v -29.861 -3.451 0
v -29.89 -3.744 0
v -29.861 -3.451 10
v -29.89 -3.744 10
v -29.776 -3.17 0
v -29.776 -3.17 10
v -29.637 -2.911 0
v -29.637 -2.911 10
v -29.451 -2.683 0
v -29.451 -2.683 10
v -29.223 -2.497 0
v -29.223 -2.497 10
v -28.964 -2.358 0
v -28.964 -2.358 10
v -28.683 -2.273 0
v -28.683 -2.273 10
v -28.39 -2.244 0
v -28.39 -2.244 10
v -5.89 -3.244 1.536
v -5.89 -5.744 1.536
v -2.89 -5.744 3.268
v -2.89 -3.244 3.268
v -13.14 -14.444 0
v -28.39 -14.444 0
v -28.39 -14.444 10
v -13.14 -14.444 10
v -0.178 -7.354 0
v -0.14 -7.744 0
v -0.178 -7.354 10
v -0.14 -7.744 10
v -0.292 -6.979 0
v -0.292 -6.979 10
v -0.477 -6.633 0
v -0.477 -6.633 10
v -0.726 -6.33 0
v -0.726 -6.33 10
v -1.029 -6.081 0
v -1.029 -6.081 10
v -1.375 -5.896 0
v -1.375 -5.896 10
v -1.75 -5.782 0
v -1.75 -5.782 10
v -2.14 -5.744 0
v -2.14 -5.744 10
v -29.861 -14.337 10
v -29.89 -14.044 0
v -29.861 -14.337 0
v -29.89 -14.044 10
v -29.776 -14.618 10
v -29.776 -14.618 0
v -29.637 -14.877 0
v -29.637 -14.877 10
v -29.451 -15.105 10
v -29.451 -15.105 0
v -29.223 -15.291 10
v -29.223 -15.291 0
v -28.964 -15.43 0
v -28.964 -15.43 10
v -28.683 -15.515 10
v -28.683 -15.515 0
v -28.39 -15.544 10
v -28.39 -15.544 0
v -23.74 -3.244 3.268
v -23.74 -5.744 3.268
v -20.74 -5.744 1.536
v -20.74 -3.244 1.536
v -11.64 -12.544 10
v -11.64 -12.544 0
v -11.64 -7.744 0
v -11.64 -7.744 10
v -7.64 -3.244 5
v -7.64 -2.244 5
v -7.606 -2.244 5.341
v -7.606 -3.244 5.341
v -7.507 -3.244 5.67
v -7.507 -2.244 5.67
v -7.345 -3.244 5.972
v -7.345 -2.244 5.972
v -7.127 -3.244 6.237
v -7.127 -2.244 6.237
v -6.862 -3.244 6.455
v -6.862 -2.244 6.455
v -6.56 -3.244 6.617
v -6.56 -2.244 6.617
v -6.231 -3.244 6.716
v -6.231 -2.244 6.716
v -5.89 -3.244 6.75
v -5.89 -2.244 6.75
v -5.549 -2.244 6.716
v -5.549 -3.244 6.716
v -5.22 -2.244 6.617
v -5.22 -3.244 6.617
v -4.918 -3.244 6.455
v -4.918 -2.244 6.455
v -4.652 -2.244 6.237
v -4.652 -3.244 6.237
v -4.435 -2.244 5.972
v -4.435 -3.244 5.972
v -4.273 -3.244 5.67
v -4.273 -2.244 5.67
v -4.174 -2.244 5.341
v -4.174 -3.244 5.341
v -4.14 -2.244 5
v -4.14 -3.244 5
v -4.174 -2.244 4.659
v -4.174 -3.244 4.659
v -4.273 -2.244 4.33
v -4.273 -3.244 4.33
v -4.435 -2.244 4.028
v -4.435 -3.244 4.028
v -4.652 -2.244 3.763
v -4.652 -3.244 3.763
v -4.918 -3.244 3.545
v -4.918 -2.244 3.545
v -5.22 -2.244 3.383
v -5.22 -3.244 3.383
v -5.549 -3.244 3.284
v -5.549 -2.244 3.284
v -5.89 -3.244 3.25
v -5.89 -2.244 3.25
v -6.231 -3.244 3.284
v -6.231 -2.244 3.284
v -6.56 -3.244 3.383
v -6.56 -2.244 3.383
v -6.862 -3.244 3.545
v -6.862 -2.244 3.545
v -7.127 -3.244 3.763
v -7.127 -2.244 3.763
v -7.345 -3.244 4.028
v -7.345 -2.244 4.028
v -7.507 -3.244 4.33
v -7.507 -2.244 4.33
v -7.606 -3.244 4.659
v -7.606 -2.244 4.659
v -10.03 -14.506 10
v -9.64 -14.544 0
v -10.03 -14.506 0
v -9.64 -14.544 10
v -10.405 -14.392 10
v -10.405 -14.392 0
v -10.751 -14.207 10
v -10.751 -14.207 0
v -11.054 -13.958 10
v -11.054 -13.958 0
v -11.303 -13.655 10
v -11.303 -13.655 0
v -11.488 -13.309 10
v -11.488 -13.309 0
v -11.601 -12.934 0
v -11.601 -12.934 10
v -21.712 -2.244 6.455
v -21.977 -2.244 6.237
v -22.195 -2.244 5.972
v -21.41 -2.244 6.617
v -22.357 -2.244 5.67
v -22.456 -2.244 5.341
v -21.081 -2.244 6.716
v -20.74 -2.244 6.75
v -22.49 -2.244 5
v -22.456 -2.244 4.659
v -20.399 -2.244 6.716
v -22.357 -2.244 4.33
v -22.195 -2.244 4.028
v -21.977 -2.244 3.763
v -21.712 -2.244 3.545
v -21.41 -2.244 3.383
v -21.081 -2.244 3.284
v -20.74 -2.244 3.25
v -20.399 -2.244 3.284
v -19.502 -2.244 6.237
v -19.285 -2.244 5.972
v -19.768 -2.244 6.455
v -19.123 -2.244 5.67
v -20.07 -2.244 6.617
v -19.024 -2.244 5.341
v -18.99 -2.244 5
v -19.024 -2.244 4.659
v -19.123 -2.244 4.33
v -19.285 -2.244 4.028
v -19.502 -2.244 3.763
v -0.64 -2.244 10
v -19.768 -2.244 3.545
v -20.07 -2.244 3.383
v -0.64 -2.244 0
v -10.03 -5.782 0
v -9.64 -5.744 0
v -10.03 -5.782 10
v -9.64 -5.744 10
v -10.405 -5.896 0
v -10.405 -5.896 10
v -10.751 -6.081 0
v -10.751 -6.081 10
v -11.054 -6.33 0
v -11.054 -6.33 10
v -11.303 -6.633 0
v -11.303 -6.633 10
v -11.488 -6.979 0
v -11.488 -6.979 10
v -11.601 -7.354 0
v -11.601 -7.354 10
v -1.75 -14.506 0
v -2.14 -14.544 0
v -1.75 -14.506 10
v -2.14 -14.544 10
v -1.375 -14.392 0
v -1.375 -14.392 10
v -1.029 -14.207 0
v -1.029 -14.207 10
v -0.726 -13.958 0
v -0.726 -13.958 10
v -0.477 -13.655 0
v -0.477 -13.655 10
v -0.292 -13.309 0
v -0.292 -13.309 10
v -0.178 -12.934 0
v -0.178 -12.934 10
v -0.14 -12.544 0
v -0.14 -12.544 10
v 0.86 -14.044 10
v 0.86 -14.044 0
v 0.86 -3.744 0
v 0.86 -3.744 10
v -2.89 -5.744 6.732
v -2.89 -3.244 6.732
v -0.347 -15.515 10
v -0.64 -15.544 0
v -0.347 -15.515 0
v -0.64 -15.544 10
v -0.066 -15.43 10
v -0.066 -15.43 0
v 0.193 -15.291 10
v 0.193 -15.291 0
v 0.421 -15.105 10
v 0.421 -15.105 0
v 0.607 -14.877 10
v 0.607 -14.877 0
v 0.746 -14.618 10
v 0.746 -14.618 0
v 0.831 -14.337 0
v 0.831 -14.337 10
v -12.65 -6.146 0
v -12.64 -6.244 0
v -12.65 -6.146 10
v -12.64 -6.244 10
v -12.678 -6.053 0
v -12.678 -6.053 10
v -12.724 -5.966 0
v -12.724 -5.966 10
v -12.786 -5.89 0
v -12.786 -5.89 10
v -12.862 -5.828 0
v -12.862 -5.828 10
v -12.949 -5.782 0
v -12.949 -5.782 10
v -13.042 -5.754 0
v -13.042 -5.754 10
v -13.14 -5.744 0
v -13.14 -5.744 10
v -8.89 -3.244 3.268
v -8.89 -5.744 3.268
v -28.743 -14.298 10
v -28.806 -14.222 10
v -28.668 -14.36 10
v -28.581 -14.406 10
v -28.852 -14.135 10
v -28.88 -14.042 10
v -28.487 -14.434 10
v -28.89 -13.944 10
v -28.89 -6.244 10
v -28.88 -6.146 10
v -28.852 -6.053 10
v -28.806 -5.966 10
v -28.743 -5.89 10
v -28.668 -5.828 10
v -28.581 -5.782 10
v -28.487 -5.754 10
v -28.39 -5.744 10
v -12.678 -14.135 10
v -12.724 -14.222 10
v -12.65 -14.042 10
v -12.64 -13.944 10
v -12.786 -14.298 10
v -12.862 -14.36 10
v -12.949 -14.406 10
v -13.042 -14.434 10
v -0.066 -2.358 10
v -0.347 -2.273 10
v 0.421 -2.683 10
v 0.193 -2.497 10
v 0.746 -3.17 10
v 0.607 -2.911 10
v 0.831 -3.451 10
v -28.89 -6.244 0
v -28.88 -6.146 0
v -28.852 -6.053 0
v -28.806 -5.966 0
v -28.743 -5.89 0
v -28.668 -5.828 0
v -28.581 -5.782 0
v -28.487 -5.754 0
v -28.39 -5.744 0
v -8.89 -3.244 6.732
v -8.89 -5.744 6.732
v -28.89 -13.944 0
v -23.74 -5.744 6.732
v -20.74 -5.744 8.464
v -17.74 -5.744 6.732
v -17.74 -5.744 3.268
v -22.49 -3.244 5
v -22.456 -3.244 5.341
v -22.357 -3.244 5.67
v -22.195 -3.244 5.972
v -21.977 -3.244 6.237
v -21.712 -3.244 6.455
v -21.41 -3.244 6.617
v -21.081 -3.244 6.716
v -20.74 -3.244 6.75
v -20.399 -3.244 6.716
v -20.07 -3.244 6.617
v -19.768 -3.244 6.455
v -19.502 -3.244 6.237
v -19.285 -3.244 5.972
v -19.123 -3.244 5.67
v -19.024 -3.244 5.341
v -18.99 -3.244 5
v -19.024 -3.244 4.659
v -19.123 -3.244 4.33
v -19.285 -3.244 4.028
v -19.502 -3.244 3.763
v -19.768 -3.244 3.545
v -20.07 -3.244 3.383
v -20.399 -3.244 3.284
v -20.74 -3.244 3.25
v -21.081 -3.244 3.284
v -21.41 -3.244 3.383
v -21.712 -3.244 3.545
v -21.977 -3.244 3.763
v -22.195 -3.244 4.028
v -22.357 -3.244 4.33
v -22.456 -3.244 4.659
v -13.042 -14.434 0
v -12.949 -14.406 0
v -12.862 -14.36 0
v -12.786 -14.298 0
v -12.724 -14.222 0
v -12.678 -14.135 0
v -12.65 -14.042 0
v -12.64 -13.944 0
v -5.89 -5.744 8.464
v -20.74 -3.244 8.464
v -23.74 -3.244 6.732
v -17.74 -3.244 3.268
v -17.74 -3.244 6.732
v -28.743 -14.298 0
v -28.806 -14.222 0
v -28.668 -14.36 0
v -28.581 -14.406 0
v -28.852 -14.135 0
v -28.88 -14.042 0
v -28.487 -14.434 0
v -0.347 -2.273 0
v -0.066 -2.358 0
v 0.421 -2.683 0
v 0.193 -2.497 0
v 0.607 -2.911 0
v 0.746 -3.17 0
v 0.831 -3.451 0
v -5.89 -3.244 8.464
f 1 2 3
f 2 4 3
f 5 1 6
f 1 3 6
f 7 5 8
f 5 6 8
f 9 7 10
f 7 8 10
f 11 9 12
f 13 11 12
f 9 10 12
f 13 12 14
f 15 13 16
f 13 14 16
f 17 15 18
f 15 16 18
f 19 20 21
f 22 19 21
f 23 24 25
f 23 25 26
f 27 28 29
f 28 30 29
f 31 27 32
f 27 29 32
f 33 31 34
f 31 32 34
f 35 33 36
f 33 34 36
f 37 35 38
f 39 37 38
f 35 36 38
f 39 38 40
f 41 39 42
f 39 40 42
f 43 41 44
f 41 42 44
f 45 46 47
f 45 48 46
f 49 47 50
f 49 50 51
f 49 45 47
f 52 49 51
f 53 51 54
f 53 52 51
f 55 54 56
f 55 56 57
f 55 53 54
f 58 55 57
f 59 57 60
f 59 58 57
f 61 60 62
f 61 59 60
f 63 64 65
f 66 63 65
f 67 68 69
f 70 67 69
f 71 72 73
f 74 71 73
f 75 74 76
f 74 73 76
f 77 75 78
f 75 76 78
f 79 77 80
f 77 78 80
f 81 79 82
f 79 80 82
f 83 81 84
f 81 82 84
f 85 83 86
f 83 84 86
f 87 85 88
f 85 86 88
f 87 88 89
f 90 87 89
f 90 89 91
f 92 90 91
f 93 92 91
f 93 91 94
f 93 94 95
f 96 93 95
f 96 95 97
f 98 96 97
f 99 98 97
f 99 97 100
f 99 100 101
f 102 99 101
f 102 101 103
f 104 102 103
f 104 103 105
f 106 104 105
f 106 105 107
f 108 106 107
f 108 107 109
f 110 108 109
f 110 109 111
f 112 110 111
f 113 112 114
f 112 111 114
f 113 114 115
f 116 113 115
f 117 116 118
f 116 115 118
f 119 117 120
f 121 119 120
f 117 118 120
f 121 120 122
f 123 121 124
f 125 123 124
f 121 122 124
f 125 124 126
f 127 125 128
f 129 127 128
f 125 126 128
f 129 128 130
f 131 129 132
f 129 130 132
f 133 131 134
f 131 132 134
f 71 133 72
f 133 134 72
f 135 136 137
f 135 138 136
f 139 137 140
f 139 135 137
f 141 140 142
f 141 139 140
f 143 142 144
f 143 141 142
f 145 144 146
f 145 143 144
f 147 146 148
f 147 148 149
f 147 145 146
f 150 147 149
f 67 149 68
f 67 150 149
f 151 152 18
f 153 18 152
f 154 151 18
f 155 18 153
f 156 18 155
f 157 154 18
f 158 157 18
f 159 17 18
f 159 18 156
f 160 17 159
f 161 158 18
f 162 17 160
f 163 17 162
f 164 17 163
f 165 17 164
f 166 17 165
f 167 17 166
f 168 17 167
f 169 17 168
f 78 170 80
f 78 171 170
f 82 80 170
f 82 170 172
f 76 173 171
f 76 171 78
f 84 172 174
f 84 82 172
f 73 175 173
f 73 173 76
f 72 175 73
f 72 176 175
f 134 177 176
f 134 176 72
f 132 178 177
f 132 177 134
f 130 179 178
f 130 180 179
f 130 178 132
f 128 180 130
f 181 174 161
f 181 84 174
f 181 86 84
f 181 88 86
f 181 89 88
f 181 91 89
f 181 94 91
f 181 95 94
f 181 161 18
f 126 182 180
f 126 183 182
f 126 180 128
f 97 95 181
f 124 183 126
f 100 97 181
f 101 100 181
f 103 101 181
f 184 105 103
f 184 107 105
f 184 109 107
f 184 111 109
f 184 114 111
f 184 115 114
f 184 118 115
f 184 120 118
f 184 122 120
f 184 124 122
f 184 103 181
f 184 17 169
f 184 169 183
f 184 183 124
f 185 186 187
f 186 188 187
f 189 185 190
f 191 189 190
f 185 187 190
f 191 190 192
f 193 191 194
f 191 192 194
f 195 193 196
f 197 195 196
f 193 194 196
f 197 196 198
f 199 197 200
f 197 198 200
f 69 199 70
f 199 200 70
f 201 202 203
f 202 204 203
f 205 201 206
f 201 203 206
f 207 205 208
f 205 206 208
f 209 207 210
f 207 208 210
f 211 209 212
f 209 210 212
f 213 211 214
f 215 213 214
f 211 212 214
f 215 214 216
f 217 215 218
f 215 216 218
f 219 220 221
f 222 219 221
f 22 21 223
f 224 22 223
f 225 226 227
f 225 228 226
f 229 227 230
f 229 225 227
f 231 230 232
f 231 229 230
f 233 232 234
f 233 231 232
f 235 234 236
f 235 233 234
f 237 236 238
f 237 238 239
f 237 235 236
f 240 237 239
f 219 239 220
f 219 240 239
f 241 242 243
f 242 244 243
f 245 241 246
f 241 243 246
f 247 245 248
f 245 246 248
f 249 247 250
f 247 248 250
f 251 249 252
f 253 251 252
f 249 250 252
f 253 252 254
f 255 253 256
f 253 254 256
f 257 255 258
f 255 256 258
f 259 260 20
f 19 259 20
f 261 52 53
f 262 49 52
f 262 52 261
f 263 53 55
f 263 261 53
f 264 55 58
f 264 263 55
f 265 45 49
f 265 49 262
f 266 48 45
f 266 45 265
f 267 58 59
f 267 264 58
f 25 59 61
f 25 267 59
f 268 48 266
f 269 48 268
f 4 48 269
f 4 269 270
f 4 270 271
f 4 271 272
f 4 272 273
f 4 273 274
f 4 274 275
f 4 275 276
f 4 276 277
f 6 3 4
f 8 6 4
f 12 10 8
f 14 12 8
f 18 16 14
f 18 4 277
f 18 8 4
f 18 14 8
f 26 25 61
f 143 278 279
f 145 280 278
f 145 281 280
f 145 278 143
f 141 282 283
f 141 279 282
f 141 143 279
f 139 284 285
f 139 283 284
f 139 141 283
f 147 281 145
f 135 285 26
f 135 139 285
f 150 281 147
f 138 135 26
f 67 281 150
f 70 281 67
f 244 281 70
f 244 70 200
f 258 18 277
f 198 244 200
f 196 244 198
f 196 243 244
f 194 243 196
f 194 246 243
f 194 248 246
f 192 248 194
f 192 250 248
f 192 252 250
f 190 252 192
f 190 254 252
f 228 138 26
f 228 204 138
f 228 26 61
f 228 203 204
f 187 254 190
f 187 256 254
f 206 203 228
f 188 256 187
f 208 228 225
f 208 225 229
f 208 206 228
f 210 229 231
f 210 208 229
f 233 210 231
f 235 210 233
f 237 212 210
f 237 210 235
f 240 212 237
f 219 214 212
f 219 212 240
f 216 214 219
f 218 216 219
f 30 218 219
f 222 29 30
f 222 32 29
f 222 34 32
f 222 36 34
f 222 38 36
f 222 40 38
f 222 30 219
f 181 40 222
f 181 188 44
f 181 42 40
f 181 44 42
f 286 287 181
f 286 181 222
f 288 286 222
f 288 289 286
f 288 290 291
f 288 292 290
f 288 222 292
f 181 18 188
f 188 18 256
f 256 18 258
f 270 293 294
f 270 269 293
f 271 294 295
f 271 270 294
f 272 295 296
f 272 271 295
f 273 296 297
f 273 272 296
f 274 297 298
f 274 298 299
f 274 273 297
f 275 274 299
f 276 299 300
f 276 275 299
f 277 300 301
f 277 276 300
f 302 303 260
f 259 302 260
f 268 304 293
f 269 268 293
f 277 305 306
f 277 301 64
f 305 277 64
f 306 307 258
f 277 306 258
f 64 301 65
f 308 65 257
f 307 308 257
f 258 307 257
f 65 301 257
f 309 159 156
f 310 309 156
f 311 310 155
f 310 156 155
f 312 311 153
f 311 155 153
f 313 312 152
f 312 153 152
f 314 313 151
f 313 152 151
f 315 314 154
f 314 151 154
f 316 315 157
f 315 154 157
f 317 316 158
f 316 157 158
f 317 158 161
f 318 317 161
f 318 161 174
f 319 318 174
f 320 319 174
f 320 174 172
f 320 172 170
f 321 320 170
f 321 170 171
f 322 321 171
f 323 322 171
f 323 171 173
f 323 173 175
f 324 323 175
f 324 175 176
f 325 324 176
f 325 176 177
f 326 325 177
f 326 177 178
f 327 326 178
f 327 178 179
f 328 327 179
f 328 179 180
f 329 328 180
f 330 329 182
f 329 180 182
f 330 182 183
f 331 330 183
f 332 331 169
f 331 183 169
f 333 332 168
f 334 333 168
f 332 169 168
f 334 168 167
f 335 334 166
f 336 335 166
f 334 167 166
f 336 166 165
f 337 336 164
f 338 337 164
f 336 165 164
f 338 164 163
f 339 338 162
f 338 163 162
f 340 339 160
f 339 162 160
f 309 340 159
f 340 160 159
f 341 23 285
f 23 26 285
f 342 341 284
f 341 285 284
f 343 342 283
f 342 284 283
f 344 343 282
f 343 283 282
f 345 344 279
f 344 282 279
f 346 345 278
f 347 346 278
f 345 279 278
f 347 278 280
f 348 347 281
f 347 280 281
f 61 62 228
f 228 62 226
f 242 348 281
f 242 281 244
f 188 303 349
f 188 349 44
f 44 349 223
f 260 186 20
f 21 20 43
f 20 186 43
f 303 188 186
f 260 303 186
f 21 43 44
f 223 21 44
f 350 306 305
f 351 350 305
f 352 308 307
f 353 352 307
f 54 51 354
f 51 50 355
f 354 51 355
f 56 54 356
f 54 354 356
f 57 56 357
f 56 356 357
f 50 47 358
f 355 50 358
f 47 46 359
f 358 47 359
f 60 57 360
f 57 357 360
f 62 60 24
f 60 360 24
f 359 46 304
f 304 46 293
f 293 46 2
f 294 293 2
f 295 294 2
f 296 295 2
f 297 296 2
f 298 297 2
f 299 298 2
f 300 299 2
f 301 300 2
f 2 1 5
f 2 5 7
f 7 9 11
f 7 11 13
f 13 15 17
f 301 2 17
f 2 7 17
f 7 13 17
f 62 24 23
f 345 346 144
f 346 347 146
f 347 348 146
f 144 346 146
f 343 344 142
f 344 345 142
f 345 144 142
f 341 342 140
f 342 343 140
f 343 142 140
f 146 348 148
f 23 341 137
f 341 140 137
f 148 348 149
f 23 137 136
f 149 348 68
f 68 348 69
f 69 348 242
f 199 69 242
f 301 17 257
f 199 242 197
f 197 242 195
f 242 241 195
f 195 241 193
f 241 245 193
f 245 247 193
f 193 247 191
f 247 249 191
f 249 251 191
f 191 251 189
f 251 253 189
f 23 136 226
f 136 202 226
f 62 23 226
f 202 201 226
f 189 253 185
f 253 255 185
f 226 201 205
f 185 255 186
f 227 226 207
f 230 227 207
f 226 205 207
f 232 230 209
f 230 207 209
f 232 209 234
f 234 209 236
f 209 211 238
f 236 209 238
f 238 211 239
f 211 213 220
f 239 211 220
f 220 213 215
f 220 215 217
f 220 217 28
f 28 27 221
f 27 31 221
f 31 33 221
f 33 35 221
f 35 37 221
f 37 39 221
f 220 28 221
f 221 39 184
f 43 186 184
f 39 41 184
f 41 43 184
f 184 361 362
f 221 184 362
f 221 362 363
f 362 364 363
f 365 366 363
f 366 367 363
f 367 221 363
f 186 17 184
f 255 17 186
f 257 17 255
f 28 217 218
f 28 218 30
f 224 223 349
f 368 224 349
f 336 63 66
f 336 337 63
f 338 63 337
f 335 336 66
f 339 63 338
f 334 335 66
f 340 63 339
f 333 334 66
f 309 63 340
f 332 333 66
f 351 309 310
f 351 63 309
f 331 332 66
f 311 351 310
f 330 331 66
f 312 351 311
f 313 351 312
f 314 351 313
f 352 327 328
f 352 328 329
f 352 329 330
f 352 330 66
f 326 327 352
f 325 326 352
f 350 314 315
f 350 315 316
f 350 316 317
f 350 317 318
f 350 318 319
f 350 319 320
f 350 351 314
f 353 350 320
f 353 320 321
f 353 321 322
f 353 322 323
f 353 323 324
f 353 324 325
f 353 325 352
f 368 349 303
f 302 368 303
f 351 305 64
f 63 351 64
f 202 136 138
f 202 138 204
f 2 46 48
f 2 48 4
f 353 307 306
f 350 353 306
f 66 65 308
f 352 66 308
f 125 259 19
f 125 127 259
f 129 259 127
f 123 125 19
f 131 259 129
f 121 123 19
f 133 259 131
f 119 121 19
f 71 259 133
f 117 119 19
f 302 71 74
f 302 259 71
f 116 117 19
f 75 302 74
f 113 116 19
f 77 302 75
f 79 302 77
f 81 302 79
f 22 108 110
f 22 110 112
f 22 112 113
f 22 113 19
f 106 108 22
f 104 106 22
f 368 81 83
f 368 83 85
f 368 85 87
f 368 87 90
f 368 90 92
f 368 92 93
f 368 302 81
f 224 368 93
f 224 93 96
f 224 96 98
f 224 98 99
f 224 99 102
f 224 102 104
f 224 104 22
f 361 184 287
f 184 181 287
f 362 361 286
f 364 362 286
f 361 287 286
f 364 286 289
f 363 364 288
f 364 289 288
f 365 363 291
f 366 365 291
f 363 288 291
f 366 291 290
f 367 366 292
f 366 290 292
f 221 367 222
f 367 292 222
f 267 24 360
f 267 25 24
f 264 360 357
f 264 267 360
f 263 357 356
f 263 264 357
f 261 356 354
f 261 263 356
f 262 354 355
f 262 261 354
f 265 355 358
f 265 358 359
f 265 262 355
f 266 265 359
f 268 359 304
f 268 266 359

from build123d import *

# Parameters (mm, degrees)
F0_W     = 30.75
F0_H     = 13.3
F0_W_2   = 16.25
F0_H_2   = 8.7
F0_W_3   = 11.5
F0_H_3   = 8.8
F1_DEPTH = 10
F2_R     = 0.5
F3_R     = 2
F4_R     = 1.5
F7_DEPTH = 2.5
F5_R     = 1.75
F8_DEPTH = 8


with BuildPart() as f1:
    # F0 (on Top) → F1 (new body)
    with BuildSketch(Plane.XY):
        with Locations((-14.5149128214, -8.8939947993)):
            Rectangle(F0_W, F0_H)
        with Locations((-20.7649128214, -10.0939947993)):
            Rectangle(F0_W_2, F0_H_2, mode=Mode.SUBTRACT)
        with Locations((-5.8899128214, -10.1439947993)):
            Rectangle(F0_W_3, F0_H_3, mode=Mode.SUBTRACT)
    extrude(amount=F1_DEPTH)

    # F2
    f2_edges = [f1.edges().sort_by_distance(p)[0] for p in [
        (-28.889913, -5.743995, 5),
        (-28.889913, -14.443995, 5),
        (-12.639913, -5.743995, 5),
        (-12.639913, -14.443995, 5),
    ]]
    fillet(f2_edges, radius=F2_R)

    # F3
    f3_edges = [f1.edges().sort_by_distance(p)[0] for p in [
        (-0.139913, -5.743995, 5),
        (-0.139913, -14.543995, 5),
        (-11.639913, -14.543995, 5),
        (-11.639913, -5.743995, 5),
    ]]
    fillet(f3_edges, radius=F3_R)

    # F4
    f4_edges = [f1.edges().sort_by_distance(p)[0] for p in [
        (-29.889913, -15.543995, 5),
        (-29.889913, -2.243995, 5),
        (0.860087, -15.543995, 5),
        (0.860087, -2.243995, 5),
    ]]
    fillet(f4_edges, radius=F4_R)

    # F6 (on face) → F7 (cut)
    with BuildSketch(Plane.XZ.offset(5.7439947993)):
        Polygon((-8.8899128214, 6.7320508076), (-8.8899128214, 3.2679491924), (-5.8899128214, 1.5358983849), (-2.8899128214, 3.2679491924), (-2.8899128214, 6.7320508076), (-5.8899128214, 8.4641016151), align=None)
        Polygon((-23.7399128214, 6.7320508076), (-23.7399128214, 3.2679491924), (-20.7399128214, 1.5358983849), (-17.7399128214, 3.2679491924), (-17.7399128214, 6.7320508076), (-20.7399128214, 8.4641016151), align=None)
    extrude(amount=-F7_DEPTH, mode=Mode.SUBTRACT)

    # F5 (on face) → F8 (cut)
    with BuildSketch(Plane(origin=(0, -2.2439947993, 0), x_dir=(-1, 0, 0), z_dir=(0, 1, 0))):
        with Locations((5.8899128214, 5)):
            Circle(F5_R)
        with Locations((20.7399128214, 5)):
            Circle(F5_R)
    extrude(amount=-F8_DEPTH, mode=Mode.SUBTRACT)


solid = f1.part
